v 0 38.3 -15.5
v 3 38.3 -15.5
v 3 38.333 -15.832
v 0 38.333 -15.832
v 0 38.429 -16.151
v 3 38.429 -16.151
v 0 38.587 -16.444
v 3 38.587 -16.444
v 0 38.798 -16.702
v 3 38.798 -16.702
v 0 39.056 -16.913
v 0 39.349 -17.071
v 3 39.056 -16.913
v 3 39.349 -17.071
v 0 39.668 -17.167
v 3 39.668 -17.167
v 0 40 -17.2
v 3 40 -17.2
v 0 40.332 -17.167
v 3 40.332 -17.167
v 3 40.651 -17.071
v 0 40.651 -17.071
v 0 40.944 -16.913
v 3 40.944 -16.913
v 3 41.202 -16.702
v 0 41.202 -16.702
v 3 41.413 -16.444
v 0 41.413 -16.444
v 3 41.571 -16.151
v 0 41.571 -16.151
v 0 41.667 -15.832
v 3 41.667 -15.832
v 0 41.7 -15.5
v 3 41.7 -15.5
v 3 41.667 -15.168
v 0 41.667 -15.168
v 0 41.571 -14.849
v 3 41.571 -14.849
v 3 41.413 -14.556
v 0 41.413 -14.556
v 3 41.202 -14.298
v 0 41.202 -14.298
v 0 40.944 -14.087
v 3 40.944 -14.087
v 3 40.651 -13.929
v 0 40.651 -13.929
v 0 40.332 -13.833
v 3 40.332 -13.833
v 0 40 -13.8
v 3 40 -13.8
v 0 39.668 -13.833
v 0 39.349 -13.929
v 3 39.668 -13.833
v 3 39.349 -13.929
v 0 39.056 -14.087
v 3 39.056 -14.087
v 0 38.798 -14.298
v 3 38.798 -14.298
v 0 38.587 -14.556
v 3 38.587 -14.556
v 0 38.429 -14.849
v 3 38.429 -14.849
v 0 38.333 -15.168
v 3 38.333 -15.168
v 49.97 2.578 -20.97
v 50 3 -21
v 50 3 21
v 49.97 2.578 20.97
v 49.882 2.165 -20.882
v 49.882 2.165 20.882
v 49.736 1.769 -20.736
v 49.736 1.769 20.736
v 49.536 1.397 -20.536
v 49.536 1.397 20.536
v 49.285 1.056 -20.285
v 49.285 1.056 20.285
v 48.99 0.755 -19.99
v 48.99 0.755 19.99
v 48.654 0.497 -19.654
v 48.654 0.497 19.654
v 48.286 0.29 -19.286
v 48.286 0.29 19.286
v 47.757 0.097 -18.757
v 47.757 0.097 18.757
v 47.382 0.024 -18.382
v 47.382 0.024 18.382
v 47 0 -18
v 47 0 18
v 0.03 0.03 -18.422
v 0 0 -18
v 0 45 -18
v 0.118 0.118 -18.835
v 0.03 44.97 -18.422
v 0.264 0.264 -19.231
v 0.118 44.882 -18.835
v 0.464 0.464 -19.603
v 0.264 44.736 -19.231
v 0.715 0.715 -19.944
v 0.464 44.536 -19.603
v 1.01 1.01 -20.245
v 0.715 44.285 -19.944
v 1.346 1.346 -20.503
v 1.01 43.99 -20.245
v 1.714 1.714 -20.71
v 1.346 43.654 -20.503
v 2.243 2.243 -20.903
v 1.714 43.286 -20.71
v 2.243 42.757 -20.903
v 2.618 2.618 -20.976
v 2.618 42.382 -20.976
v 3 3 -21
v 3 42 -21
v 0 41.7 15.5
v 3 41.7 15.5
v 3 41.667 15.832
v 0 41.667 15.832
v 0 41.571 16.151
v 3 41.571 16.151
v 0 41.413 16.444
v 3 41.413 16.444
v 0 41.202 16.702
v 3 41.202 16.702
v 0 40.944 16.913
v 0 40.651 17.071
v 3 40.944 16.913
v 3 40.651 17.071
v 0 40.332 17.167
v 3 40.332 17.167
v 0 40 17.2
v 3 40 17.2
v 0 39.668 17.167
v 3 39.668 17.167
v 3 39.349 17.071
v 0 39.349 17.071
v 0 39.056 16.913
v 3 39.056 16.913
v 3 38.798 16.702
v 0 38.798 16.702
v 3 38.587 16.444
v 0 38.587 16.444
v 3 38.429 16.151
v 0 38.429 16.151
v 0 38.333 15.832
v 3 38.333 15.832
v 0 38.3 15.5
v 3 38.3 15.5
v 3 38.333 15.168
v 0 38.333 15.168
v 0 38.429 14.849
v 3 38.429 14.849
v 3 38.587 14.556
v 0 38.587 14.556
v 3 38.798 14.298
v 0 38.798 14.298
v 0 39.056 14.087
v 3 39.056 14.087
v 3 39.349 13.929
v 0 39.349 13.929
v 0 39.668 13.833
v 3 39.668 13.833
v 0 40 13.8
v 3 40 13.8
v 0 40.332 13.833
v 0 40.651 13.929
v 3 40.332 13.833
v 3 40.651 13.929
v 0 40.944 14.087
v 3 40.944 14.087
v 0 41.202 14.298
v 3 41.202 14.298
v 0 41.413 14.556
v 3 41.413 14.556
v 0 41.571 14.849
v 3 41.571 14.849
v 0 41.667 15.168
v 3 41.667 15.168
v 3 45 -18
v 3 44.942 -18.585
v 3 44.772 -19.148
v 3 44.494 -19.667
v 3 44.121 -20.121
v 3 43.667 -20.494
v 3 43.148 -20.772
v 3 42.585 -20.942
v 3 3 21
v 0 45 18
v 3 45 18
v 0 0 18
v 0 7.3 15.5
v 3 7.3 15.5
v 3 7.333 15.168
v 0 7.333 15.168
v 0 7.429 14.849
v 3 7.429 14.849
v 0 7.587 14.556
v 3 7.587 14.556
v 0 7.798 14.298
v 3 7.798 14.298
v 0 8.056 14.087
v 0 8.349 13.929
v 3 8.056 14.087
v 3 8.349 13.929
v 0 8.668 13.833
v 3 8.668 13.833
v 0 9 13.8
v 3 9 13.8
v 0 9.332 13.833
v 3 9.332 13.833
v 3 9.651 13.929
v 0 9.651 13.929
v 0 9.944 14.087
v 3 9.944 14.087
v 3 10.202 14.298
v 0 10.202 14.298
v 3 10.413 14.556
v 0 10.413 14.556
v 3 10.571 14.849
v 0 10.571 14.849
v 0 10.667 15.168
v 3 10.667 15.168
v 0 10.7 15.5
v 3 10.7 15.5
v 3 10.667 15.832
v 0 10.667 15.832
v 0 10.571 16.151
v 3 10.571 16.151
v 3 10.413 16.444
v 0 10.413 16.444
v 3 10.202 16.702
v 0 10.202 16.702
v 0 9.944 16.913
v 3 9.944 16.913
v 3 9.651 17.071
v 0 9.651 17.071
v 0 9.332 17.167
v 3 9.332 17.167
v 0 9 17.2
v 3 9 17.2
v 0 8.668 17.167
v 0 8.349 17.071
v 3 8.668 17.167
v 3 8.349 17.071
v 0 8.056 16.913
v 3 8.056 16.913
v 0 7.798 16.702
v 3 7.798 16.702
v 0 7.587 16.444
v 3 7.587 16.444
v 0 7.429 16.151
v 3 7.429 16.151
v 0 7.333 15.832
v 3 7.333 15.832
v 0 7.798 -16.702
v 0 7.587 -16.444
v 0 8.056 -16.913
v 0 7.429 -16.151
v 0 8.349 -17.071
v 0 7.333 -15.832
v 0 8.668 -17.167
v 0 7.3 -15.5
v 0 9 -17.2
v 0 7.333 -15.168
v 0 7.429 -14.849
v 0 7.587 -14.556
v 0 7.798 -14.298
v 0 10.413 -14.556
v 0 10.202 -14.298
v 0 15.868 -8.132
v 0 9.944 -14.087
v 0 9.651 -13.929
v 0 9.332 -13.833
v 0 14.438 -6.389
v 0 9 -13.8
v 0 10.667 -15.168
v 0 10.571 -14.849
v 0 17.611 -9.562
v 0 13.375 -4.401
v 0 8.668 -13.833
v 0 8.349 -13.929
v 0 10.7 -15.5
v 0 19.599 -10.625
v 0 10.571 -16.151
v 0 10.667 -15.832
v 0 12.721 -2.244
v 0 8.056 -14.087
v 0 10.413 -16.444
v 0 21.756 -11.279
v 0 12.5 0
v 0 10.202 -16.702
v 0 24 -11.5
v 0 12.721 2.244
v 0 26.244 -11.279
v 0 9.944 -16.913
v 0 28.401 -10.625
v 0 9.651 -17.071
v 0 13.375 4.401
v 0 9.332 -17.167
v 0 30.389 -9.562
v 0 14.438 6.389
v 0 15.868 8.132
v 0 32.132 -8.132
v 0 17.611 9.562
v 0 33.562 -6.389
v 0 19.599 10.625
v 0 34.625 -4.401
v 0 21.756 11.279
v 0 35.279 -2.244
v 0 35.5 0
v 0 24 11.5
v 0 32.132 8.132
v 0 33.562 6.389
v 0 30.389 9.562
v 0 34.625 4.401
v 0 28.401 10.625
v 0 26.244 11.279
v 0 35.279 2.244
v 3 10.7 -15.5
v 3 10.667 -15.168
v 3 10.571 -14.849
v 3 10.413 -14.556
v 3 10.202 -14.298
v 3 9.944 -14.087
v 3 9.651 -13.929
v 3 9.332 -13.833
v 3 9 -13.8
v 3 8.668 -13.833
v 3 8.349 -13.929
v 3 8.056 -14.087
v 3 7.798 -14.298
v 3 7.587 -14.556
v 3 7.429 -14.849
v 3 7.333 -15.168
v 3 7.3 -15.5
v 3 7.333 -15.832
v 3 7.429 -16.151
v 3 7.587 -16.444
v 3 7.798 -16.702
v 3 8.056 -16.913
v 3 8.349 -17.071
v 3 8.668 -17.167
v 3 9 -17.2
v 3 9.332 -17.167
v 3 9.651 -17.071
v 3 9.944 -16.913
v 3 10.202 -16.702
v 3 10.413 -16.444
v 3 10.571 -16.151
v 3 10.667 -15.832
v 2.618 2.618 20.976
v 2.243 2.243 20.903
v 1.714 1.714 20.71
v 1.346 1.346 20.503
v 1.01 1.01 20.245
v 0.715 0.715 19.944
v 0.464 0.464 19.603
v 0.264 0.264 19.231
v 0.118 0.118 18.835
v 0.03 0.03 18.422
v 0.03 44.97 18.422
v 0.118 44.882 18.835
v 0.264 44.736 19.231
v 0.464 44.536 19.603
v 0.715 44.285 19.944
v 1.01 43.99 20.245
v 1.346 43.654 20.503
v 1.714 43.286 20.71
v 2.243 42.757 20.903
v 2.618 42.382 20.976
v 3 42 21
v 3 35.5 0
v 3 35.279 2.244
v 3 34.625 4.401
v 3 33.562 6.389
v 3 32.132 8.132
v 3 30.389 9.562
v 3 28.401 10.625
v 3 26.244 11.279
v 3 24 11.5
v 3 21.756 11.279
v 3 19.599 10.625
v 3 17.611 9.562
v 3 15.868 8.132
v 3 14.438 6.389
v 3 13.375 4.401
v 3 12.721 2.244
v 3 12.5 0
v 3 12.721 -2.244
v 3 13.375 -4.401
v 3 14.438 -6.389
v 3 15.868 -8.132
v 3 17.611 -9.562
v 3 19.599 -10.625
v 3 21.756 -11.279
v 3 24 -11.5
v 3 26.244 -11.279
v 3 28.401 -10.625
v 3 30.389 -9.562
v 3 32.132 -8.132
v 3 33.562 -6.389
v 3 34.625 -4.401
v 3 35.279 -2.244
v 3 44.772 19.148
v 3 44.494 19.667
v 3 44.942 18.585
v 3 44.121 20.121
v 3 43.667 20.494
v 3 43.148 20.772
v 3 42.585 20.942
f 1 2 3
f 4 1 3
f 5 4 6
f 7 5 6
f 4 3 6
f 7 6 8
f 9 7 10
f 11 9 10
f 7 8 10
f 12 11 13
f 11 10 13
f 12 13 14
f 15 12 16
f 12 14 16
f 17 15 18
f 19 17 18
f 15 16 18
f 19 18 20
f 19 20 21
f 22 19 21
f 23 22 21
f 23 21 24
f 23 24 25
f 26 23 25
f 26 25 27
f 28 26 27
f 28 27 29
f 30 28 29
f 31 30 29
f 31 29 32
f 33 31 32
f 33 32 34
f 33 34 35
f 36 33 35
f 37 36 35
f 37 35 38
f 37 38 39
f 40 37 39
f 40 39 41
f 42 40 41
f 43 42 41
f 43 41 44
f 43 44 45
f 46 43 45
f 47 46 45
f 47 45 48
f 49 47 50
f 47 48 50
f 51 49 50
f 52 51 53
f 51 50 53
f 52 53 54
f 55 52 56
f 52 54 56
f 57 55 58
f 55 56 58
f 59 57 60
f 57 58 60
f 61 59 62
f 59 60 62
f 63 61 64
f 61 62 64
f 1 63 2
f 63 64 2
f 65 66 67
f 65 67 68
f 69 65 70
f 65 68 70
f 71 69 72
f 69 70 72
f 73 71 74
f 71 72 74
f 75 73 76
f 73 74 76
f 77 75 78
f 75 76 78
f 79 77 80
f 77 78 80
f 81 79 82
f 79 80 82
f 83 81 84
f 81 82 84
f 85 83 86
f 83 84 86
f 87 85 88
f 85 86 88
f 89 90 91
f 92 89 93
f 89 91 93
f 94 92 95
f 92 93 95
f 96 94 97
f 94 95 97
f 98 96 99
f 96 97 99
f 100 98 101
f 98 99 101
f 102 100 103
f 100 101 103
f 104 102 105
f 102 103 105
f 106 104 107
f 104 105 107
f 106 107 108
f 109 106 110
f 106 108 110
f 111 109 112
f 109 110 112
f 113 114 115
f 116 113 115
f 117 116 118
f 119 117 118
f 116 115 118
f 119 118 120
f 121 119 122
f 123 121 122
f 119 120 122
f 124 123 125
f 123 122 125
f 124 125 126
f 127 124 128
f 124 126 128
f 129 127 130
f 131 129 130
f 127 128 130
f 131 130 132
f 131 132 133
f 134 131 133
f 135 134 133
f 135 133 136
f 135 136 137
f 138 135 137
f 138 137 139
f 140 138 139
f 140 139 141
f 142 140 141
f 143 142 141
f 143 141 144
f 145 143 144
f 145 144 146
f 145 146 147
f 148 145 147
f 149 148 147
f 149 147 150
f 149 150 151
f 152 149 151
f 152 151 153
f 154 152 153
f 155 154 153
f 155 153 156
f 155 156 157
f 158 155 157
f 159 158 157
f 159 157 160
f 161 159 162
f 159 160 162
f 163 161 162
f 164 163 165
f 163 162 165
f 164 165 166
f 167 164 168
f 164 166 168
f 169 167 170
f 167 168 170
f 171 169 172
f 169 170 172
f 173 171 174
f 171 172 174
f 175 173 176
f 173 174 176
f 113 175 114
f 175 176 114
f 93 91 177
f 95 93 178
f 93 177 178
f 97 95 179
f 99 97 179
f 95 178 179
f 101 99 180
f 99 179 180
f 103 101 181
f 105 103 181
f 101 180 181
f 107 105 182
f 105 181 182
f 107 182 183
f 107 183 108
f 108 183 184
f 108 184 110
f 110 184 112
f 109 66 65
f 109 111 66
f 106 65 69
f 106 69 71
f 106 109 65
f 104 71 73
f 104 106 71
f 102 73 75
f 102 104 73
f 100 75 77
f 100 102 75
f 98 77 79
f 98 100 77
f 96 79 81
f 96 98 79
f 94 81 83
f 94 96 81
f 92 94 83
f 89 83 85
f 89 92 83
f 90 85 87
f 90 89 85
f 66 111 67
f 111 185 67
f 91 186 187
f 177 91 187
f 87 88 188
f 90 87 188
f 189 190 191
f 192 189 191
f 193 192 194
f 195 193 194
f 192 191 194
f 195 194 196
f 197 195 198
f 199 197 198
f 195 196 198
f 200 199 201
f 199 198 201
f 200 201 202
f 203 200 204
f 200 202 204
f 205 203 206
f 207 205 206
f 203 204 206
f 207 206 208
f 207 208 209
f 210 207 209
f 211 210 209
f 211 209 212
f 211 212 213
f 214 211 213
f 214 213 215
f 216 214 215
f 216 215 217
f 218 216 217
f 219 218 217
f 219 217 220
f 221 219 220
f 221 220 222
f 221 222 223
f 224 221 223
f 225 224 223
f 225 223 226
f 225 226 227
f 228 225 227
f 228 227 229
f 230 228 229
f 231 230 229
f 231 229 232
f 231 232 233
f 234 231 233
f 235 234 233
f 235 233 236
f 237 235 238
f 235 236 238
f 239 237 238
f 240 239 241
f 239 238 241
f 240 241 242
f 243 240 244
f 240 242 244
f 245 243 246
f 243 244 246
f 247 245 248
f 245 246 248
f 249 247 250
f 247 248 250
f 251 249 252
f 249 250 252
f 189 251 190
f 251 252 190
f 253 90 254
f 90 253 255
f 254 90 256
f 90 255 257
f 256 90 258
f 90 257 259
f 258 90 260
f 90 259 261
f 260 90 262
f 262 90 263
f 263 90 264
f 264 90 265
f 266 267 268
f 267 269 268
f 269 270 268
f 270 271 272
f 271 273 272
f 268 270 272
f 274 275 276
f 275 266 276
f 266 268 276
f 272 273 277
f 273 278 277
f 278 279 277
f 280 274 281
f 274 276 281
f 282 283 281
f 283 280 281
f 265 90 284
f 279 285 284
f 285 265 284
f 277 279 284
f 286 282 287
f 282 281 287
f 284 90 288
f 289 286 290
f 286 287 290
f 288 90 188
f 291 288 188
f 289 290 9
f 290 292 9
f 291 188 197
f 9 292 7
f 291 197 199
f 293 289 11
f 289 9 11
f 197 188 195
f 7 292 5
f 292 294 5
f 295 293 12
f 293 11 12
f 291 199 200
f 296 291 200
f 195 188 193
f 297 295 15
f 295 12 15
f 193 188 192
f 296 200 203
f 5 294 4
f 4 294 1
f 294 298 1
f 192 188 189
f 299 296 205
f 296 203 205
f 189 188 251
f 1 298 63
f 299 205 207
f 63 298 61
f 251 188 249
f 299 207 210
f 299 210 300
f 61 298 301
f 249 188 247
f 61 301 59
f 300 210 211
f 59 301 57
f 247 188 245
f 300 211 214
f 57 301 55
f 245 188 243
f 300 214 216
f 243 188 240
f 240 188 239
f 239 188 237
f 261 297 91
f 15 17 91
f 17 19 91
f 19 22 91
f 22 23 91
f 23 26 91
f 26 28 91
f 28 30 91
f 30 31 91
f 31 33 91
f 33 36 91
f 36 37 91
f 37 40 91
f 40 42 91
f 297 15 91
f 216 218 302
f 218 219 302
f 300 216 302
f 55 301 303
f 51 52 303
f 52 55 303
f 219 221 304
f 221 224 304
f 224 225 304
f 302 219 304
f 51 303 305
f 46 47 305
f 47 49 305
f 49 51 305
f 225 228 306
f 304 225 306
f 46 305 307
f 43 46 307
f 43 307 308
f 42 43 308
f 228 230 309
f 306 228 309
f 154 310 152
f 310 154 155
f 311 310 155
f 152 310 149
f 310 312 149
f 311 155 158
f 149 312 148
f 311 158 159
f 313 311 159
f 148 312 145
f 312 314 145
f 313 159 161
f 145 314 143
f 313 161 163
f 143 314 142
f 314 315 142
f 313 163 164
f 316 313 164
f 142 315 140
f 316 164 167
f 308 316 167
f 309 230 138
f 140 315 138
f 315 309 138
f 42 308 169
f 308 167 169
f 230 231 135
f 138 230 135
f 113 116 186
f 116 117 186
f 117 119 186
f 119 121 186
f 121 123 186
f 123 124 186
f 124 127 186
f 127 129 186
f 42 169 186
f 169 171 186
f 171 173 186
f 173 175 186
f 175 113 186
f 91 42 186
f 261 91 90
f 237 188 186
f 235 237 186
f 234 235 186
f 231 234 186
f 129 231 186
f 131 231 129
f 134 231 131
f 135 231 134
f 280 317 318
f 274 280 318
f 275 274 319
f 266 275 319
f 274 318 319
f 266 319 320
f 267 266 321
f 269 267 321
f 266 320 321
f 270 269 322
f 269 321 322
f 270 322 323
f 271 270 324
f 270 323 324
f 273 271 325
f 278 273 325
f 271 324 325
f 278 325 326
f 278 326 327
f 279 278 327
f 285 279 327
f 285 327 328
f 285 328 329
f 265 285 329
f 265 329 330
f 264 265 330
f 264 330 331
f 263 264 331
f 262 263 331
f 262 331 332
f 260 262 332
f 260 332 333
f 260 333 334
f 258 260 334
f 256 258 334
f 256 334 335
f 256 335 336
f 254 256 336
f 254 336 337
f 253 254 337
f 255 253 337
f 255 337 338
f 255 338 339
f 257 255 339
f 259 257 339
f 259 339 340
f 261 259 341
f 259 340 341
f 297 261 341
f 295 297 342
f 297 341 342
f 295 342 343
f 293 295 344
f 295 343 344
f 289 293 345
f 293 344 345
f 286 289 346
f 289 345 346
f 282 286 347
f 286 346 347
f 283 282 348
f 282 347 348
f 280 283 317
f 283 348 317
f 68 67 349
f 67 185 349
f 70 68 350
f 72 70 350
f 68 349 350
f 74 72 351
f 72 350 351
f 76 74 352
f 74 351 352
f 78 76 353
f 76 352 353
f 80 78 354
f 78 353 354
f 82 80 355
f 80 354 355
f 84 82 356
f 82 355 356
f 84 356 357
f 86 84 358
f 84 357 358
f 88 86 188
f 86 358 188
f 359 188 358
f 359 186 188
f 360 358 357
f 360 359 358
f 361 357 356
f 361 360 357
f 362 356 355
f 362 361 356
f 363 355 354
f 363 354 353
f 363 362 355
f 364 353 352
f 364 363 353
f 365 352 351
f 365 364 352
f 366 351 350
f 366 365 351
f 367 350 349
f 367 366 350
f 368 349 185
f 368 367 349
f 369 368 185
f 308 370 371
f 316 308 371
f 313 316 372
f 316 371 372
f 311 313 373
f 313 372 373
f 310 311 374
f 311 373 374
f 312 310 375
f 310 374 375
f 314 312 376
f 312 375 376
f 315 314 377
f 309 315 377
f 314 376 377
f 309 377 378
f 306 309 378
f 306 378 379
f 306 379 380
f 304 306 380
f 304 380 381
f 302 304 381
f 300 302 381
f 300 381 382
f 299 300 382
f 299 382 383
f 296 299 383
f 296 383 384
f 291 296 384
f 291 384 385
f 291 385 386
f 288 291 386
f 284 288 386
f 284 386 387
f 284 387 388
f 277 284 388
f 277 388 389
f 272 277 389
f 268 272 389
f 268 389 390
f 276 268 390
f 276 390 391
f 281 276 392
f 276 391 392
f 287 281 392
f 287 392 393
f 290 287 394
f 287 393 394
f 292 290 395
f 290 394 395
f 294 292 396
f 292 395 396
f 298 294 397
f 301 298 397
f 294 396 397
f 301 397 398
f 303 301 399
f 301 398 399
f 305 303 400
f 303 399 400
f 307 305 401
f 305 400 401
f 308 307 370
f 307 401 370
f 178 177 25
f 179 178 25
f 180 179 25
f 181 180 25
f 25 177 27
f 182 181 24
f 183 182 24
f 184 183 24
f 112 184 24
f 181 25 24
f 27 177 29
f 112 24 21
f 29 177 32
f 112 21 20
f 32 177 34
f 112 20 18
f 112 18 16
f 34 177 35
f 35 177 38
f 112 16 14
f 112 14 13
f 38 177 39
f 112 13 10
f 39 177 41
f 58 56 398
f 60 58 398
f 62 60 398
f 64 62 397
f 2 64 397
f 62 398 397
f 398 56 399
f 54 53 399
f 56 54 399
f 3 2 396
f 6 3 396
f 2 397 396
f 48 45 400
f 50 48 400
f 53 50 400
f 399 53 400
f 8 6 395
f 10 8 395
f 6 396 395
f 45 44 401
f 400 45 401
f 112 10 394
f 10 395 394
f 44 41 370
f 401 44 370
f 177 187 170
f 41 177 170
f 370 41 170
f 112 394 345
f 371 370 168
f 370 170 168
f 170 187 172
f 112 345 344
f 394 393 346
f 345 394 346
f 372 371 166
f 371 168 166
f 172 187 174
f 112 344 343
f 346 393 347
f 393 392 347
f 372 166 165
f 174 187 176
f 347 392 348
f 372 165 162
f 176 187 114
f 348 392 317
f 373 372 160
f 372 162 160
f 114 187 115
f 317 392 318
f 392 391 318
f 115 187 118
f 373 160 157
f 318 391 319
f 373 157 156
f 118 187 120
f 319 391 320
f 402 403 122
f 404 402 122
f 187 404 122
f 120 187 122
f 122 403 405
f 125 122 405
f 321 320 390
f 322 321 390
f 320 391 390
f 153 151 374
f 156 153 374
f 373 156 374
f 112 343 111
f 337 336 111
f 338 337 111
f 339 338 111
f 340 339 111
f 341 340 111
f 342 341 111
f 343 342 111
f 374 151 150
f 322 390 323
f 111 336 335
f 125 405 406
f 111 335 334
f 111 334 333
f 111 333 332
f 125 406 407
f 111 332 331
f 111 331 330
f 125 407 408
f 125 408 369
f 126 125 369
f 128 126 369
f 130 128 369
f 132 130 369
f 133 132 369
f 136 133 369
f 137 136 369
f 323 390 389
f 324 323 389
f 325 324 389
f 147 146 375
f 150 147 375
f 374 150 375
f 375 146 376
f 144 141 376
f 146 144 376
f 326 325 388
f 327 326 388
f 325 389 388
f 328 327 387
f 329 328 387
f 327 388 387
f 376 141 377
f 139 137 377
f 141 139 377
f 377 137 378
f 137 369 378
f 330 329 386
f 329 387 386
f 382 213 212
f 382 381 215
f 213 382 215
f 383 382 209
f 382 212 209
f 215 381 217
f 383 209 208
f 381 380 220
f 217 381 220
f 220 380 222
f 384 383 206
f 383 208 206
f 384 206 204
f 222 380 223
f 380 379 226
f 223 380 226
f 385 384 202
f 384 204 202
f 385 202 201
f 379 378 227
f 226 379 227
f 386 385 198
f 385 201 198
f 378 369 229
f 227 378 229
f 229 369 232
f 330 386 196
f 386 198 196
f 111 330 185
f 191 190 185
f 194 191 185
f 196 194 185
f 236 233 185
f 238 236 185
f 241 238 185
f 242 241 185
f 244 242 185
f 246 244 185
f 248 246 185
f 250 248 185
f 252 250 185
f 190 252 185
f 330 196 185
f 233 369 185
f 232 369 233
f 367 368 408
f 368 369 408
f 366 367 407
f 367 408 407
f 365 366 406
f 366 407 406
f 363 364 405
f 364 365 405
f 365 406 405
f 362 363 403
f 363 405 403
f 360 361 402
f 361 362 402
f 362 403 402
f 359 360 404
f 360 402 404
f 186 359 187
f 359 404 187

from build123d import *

# Parameters (mm, degrees)
BOSS_EXTRUDE1_DEPTH = 21
FILLET1_R           = 3
SKETCH2_R           = 11.5
SKETCH2_R_2         = 1.7
CUT_EXTRUDE2_DEPTH  = 69.373971656


with BuildPart() as part:
    # Sketch1 → Boss-Extrude1 (new, symmetric)
    with BuildSketch(Plane.XY):
        Polygon((0, 0), (0, 45), (3, 45), (3, 3), (50, 3), (50, 0), align=None)
    extrude(amount=BOSS_EXTRUDE1_DEPTH, both=True)

    # Fillet1
    fillet1_edges = [part.edges().sort_by_distance(p)[0] for p in [
        (0, 22.5, -21),
        (25, 0, -21),
        (50, 0, 0),
        (0, 22.5, 21),
        (25, 0, 21),
        (1.5, 45, -21),
        (1.5, 45, 21),
    ]]
    fillet(fillet1_edges, radius=FILLET1_R - 0.0001)  # a hair under: the kernel refuses the full size

    # Sketch2 → Cut-Extrude2 (cut, through all)
    with BuildSketch(Plane(origin=(3, 0, 0), x_dir=(0, 0, -1), z_dir=(1, 0, 0))):
        with Locations(Location((0, 24, 0), (0, 0, 90))):
            Circle(SKETCH2_R)
        with Locations(Location((-15.5, 40, 0), (0, 0, 90))):
            Circle(SKETCH2_R_2)
        with Locations(Location((-15.5, 9, 0), (0, 0, 270))):
            Circle(SKETCH2_R_2)
        with Locations(Location((15.5, 9, 0), (0, 0, 90))):
            Circle(SKETCH2_R_2)
        with Locations(Location((15.5, 40, 0), (0, 0, 270))):
            Circle(SKETCH2_R_2)
    extrude(amount=-CUT_EXTRUDE2_DEPTH, mode=Mode.SUBTRACT)


solid = part.part
